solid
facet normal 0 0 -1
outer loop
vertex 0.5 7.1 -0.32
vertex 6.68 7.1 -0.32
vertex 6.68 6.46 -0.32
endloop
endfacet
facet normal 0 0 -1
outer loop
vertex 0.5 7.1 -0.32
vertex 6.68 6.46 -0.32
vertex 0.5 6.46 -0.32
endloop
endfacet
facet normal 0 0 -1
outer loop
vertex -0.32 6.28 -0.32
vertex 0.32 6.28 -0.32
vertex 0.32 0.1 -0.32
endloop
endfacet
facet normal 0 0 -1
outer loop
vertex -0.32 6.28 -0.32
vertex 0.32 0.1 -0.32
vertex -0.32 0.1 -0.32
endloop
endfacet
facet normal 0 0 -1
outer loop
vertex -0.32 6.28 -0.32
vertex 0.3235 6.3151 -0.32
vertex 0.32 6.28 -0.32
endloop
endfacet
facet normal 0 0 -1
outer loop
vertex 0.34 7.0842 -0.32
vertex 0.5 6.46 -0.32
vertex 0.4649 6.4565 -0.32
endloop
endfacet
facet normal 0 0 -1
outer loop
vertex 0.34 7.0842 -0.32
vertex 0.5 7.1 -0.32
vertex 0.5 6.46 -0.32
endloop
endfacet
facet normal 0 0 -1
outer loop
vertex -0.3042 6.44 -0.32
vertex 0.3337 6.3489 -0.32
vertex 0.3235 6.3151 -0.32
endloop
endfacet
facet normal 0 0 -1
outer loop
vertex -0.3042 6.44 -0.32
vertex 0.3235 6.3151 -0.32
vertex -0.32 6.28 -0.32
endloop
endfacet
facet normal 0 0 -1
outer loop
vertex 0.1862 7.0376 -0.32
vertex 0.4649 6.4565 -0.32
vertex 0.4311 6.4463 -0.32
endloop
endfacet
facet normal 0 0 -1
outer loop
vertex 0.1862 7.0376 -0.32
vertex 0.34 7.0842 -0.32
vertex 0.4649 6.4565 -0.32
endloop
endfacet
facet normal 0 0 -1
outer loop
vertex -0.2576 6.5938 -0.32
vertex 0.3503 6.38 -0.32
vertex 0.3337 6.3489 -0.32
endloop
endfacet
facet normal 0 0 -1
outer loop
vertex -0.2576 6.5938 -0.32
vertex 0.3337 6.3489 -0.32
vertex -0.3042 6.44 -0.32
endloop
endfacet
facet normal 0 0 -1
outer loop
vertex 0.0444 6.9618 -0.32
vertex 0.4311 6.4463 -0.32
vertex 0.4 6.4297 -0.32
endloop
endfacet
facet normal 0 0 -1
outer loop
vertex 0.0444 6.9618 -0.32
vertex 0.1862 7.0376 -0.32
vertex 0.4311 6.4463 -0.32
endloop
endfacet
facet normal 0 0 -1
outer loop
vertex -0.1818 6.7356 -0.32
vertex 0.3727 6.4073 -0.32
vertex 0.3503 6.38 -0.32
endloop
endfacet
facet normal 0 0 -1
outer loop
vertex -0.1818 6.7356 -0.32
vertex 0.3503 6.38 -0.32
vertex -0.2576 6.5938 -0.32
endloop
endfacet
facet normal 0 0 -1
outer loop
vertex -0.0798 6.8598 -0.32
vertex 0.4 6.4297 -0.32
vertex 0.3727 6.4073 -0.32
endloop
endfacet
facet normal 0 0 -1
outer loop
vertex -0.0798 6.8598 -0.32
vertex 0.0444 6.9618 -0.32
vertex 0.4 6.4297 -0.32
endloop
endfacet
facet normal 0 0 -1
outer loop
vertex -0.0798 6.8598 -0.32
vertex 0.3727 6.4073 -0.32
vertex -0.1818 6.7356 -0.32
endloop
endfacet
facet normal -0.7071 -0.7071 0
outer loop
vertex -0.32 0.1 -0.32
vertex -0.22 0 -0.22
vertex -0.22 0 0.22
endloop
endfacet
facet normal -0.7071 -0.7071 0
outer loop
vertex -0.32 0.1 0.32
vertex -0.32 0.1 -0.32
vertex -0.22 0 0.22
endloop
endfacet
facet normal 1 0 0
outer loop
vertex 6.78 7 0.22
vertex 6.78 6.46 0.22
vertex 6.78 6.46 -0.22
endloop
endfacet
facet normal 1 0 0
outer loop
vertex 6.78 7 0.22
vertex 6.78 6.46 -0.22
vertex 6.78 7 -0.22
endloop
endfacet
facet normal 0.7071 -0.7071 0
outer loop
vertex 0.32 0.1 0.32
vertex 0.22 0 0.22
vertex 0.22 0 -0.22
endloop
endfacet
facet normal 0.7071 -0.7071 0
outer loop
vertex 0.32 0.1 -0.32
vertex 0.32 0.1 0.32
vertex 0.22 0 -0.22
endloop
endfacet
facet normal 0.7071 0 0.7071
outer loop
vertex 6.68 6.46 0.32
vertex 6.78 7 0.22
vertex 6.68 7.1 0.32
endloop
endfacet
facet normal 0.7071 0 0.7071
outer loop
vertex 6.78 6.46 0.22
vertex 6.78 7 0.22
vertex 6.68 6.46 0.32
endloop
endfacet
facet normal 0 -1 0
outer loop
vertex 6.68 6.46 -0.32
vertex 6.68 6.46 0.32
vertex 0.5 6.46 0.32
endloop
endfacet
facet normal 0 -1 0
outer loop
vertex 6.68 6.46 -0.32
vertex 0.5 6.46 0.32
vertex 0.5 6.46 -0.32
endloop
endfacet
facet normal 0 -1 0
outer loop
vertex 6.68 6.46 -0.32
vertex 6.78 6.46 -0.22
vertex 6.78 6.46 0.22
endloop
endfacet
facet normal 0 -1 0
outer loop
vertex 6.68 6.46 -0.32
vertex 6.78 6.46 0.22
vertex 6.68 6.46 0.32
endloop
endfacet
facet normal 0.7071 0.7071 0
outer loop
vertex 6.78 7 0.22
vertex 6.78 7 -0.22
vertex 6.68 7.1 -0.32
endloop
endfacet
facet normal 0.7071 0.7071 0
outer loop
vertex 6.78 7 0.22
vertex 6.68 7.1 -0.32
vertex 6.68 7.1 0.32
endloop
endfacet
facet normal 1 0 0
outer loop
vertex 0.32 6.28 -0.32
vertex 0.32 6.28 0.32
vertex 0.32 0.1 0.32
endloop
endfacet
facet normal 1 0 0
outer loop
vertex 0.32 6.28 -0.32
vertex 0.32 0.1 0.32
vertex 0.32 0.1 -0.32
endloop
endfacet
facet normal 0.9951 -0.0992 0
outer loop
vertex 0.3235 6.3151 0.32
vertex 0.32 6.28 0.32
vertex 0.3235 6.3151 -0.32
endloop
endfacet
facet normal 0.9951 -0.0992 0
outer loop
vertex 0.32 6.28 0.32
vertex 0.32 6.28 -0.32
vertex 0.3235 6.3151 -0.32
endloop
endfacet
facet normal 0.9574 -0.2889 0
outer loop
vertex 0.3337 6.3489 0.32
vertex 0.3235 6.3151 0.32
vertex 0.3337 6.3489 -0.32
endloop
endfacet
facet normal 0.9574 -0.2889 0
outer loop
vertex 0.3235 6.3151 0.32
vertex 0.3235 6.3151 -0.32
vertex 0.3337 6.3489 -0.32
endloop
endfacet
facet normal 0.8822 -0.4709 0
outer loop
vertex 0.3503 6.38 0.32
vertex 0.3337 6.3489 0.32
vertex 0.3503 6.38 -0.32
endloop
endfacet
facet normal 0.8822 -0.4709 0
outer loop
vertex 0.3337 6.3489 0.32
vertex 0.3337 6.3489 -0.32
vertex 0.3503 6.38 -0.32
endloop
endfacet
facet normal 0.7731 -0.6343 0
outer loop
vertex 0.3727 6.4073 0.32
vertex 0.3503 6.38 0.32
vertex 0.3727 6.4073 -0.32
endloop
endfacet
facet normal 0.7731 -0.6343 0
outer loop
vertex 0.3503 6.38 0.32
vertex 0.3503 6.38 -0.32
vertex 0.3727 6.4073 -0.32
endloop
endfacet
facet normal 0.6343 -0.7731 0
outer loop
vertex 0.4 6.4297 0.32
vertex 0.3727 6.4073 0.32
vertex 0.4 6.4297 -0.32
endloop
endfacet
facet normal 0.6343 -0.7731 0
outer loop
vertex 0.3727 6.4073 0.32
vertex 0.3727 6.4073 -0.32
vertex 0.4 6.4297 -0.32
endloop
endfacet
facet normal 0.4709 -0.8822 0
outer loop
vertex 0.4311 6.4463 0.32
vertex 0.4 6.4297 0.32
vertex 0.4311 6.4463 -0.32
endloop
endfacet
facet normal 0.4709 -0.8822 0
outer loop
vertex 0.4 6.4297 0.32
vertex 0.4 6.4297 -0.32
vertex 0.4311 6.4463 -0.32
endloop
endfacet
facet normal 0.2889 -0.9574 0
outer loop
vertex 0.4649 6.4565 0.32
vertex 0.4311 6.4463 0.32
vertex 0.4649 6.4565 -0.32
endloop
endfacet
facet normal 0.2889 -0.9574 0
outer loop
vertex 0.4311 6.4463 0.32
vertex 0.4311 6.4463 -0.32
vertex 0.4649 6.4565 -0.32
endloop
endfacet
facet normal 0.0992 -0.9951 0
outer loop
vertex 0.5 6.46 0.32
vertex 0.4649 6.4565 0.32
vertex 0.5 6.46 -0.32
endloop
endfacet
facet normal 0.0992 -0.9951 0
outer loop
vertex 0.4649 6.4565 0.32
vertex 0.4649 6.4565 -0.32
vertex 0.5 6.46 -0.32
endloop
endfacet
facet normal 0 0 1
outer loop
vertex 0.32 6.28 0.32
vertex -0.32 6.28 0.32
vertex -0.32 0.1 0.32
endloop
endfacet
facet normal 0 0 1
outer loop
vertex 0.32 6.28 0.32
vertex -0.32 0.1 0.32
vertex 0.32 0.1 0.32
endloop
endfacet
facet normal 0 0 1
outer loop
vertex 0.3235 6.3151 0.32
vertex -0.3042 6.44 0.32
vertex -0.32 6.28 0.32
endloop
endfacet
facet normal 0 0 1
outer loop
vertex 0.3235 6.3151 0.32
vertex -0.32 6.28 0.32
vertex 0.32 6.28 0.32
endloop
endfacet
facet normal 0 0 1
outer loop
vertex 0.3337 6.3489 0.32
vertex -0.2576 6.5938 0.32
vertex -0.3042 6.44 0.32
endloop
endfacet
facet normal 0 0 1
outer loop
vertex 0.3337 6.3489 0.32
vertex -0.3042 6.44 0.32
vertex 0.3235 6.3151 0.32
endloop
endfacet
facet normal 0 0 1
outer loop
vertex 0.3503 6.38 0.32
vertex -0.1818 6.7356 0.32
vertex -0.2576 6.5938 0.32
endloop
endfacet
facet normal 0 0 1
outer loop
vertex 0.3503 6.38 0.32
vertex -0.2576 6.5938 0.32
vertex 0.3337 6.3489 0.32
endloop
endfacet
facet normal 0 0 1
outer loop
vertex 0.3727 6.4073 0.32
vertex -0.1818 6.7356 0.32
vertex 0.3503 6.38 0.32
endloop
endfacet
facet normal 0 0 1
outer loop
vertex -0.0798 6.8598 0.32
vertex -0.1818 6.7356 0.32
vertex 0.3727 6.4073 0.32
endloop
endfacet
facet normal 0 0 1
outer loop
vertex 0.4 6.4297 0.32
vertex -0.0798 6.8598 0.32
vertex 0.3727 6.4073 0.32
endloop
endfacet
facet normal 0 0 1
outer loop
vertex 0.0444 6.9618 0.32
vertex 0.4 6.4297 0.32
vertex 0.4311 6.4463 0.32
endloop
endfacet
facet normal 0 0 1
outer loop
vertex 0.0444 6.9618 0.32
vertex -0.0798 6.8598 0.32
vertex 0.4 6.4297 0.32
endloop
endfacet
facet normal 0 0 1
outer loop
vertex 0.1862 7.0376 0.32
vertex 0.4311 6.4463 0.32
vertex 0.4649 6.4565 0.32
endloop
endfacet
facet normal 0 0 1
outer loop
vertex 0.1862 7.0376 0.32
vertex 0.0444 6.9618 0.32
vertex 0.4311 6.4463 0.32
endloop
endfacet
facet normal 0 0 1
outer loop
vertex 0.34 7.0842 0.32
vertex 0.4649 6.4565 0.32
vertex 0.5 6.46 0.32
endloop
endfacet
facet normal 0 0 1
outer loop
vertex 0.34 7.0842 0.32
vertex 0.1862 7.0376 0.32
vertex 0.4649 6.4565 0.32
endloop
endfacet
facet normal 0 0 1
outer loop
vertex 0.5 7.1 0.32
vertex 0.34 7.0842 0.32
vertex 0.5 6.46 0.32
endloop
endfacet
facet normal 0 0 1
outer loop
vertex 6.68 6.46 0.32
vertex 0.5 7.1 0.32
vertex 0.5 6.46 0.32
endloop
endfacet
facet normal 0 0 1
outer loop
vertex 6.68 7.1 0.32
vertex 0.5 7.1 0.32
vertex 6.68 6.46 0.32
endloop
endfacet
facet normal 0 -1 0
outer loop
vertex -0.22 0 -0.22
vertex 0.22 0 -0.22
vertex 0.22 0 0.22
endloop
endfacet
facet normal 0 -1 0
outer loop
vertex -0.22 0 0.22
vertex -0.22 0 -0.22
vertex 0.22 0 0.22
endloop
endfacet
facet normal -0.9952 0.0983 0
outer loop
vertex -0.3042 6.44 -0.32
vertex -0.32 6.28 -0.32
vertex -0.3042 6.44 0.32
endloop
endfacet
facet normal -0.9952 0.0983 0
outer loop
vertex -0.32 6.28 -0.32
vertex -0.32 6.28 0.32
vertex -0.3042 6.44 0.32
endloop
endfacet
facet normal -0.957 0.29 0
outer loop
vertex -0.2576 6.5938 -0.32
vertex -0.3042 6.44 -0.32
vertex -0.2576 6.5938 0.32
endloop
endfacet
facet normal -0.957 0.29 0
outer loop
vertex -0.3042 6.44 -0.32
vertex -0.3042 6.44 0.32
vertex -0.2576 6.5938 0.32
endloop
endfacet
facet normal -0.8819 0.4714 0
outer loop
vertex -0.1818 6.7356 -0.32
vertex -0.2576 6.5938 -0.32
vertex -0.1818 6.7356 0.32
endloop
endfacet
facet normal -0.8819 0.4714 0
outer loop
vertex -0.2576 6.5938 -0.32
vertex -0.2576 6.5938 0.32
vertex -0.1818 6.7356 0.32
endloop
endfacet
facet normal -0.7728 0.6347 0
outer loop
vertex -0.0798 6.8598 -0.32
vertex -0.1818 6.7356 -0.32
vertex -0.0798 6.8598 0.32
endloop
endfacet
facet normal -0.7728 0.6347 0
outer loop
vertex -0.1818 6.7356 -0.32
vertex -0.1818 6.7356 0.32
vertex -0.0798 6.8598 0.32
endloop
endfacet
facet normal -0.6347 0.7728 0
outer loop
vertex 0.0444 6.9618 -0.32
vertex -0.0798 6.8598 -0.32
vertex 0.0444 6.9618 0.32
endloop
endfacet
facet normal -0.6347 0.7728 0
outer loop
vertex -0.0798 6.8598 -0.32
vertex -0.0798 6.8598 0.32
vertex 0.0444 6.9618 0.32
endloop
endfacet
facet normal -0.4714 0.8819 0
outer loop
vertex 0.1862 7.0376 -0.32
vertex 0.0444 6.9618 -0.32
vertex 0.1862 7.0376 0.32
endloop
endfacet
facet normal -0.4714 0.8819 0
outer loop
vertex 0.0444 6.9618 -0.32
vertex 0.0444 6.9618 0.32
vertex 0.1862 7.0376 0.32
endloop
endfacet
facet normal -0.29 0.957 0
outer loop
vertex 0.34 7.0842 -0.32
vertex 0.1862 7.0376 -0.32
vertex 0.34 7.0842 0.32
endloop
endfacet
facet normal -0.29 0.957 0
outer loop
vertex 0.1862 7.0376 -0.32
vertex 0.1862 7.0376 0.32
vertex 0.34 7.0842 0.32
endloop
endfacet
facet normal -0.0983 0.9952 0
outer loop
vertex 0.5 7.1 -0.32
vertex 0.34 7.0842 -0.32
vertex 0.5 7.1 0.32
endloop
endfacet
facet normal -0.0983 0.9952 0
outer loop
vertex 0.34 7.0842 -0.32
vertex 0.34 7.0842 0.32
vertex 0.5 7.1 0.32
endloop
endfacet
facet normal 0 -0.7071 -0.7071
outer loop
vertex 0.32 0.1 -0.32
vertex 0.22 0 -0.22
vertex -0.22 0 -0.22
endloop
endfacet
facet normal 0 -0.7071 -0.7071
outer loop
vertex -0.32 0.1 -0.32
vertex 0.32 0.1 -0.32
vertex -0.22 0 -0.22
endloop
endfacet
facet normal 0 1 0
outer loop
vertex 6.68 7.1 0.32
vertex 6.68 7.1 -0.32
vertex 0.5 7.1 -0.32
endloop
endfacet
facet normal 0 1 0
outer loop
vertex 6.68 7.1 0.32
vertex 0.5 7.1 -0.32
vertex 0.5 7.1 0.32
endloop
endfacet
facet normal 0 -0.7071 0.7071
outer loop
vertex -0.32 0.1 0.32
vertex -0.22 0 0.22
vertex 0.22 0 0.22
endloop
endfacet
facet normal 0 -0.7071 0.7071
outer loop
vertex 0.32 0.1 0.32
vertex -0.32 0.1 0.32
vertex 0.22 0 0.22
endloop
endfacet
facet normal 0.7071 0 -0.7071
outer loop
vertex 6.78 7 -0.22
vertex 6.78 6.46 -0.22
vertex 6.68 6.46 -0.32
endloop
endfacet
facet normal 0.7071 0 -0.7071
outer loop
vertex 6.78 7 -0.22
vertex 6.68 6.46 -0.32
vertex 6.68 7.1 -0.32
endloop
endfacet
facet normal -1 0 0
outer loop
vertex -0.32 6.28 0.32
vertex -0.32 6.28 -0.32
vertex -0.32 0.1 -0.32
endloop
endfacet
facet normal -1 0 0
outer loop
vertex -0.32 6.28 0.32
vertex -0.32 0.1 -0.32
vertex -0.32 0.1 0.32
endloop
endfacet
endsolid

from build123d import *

# Parameters (mm, degrees)
SKETCH_1_W     = 0.64
SKETCH_1_H     = 0.64
CHAMFER_1_SIZE = 0.1


with BuildPart() as part:
    # По траектории1: sweep along a path in Эскиз2
    with BuildLine(Plane.XY) as sweep_1_path:
        Line((0, 0), (0, 6.28))
        ThreePointArc((0, 6.28), (0.146446609, 6.633553391), (0.5, 6.78))
        Line((0.5, 6.78), (6.78, 6.78))
    # Эскиз1 → По траектории1 (sweep)
    with BuildSketch(Plane(origin=(0, 0, 0), x_dir=(1, 0, 0), z_dir=(0, 1, 0))):
        Rectangle(SKETCH_1_W, SKETCH_1_H)
    sweep(path=sweep_1_path.line)

    # Фаска1
    chamfer_1_edges = [part.edges().sort_by_distance(p)[0] for p in [
        (6.78, 6.78, 0.32),
        (6.78, 7.1, 0),
        (6.78, 6.78, -0.32),
        (0, 0, 0.32),
        (-0.32, 0, 0),
        (0, 0, -0.32),
        (0.32, 0, 0),
    ]]
    chamfer(chamfer_1_edges, length=CHAMFER_1_SIZE)


solid = part.part
